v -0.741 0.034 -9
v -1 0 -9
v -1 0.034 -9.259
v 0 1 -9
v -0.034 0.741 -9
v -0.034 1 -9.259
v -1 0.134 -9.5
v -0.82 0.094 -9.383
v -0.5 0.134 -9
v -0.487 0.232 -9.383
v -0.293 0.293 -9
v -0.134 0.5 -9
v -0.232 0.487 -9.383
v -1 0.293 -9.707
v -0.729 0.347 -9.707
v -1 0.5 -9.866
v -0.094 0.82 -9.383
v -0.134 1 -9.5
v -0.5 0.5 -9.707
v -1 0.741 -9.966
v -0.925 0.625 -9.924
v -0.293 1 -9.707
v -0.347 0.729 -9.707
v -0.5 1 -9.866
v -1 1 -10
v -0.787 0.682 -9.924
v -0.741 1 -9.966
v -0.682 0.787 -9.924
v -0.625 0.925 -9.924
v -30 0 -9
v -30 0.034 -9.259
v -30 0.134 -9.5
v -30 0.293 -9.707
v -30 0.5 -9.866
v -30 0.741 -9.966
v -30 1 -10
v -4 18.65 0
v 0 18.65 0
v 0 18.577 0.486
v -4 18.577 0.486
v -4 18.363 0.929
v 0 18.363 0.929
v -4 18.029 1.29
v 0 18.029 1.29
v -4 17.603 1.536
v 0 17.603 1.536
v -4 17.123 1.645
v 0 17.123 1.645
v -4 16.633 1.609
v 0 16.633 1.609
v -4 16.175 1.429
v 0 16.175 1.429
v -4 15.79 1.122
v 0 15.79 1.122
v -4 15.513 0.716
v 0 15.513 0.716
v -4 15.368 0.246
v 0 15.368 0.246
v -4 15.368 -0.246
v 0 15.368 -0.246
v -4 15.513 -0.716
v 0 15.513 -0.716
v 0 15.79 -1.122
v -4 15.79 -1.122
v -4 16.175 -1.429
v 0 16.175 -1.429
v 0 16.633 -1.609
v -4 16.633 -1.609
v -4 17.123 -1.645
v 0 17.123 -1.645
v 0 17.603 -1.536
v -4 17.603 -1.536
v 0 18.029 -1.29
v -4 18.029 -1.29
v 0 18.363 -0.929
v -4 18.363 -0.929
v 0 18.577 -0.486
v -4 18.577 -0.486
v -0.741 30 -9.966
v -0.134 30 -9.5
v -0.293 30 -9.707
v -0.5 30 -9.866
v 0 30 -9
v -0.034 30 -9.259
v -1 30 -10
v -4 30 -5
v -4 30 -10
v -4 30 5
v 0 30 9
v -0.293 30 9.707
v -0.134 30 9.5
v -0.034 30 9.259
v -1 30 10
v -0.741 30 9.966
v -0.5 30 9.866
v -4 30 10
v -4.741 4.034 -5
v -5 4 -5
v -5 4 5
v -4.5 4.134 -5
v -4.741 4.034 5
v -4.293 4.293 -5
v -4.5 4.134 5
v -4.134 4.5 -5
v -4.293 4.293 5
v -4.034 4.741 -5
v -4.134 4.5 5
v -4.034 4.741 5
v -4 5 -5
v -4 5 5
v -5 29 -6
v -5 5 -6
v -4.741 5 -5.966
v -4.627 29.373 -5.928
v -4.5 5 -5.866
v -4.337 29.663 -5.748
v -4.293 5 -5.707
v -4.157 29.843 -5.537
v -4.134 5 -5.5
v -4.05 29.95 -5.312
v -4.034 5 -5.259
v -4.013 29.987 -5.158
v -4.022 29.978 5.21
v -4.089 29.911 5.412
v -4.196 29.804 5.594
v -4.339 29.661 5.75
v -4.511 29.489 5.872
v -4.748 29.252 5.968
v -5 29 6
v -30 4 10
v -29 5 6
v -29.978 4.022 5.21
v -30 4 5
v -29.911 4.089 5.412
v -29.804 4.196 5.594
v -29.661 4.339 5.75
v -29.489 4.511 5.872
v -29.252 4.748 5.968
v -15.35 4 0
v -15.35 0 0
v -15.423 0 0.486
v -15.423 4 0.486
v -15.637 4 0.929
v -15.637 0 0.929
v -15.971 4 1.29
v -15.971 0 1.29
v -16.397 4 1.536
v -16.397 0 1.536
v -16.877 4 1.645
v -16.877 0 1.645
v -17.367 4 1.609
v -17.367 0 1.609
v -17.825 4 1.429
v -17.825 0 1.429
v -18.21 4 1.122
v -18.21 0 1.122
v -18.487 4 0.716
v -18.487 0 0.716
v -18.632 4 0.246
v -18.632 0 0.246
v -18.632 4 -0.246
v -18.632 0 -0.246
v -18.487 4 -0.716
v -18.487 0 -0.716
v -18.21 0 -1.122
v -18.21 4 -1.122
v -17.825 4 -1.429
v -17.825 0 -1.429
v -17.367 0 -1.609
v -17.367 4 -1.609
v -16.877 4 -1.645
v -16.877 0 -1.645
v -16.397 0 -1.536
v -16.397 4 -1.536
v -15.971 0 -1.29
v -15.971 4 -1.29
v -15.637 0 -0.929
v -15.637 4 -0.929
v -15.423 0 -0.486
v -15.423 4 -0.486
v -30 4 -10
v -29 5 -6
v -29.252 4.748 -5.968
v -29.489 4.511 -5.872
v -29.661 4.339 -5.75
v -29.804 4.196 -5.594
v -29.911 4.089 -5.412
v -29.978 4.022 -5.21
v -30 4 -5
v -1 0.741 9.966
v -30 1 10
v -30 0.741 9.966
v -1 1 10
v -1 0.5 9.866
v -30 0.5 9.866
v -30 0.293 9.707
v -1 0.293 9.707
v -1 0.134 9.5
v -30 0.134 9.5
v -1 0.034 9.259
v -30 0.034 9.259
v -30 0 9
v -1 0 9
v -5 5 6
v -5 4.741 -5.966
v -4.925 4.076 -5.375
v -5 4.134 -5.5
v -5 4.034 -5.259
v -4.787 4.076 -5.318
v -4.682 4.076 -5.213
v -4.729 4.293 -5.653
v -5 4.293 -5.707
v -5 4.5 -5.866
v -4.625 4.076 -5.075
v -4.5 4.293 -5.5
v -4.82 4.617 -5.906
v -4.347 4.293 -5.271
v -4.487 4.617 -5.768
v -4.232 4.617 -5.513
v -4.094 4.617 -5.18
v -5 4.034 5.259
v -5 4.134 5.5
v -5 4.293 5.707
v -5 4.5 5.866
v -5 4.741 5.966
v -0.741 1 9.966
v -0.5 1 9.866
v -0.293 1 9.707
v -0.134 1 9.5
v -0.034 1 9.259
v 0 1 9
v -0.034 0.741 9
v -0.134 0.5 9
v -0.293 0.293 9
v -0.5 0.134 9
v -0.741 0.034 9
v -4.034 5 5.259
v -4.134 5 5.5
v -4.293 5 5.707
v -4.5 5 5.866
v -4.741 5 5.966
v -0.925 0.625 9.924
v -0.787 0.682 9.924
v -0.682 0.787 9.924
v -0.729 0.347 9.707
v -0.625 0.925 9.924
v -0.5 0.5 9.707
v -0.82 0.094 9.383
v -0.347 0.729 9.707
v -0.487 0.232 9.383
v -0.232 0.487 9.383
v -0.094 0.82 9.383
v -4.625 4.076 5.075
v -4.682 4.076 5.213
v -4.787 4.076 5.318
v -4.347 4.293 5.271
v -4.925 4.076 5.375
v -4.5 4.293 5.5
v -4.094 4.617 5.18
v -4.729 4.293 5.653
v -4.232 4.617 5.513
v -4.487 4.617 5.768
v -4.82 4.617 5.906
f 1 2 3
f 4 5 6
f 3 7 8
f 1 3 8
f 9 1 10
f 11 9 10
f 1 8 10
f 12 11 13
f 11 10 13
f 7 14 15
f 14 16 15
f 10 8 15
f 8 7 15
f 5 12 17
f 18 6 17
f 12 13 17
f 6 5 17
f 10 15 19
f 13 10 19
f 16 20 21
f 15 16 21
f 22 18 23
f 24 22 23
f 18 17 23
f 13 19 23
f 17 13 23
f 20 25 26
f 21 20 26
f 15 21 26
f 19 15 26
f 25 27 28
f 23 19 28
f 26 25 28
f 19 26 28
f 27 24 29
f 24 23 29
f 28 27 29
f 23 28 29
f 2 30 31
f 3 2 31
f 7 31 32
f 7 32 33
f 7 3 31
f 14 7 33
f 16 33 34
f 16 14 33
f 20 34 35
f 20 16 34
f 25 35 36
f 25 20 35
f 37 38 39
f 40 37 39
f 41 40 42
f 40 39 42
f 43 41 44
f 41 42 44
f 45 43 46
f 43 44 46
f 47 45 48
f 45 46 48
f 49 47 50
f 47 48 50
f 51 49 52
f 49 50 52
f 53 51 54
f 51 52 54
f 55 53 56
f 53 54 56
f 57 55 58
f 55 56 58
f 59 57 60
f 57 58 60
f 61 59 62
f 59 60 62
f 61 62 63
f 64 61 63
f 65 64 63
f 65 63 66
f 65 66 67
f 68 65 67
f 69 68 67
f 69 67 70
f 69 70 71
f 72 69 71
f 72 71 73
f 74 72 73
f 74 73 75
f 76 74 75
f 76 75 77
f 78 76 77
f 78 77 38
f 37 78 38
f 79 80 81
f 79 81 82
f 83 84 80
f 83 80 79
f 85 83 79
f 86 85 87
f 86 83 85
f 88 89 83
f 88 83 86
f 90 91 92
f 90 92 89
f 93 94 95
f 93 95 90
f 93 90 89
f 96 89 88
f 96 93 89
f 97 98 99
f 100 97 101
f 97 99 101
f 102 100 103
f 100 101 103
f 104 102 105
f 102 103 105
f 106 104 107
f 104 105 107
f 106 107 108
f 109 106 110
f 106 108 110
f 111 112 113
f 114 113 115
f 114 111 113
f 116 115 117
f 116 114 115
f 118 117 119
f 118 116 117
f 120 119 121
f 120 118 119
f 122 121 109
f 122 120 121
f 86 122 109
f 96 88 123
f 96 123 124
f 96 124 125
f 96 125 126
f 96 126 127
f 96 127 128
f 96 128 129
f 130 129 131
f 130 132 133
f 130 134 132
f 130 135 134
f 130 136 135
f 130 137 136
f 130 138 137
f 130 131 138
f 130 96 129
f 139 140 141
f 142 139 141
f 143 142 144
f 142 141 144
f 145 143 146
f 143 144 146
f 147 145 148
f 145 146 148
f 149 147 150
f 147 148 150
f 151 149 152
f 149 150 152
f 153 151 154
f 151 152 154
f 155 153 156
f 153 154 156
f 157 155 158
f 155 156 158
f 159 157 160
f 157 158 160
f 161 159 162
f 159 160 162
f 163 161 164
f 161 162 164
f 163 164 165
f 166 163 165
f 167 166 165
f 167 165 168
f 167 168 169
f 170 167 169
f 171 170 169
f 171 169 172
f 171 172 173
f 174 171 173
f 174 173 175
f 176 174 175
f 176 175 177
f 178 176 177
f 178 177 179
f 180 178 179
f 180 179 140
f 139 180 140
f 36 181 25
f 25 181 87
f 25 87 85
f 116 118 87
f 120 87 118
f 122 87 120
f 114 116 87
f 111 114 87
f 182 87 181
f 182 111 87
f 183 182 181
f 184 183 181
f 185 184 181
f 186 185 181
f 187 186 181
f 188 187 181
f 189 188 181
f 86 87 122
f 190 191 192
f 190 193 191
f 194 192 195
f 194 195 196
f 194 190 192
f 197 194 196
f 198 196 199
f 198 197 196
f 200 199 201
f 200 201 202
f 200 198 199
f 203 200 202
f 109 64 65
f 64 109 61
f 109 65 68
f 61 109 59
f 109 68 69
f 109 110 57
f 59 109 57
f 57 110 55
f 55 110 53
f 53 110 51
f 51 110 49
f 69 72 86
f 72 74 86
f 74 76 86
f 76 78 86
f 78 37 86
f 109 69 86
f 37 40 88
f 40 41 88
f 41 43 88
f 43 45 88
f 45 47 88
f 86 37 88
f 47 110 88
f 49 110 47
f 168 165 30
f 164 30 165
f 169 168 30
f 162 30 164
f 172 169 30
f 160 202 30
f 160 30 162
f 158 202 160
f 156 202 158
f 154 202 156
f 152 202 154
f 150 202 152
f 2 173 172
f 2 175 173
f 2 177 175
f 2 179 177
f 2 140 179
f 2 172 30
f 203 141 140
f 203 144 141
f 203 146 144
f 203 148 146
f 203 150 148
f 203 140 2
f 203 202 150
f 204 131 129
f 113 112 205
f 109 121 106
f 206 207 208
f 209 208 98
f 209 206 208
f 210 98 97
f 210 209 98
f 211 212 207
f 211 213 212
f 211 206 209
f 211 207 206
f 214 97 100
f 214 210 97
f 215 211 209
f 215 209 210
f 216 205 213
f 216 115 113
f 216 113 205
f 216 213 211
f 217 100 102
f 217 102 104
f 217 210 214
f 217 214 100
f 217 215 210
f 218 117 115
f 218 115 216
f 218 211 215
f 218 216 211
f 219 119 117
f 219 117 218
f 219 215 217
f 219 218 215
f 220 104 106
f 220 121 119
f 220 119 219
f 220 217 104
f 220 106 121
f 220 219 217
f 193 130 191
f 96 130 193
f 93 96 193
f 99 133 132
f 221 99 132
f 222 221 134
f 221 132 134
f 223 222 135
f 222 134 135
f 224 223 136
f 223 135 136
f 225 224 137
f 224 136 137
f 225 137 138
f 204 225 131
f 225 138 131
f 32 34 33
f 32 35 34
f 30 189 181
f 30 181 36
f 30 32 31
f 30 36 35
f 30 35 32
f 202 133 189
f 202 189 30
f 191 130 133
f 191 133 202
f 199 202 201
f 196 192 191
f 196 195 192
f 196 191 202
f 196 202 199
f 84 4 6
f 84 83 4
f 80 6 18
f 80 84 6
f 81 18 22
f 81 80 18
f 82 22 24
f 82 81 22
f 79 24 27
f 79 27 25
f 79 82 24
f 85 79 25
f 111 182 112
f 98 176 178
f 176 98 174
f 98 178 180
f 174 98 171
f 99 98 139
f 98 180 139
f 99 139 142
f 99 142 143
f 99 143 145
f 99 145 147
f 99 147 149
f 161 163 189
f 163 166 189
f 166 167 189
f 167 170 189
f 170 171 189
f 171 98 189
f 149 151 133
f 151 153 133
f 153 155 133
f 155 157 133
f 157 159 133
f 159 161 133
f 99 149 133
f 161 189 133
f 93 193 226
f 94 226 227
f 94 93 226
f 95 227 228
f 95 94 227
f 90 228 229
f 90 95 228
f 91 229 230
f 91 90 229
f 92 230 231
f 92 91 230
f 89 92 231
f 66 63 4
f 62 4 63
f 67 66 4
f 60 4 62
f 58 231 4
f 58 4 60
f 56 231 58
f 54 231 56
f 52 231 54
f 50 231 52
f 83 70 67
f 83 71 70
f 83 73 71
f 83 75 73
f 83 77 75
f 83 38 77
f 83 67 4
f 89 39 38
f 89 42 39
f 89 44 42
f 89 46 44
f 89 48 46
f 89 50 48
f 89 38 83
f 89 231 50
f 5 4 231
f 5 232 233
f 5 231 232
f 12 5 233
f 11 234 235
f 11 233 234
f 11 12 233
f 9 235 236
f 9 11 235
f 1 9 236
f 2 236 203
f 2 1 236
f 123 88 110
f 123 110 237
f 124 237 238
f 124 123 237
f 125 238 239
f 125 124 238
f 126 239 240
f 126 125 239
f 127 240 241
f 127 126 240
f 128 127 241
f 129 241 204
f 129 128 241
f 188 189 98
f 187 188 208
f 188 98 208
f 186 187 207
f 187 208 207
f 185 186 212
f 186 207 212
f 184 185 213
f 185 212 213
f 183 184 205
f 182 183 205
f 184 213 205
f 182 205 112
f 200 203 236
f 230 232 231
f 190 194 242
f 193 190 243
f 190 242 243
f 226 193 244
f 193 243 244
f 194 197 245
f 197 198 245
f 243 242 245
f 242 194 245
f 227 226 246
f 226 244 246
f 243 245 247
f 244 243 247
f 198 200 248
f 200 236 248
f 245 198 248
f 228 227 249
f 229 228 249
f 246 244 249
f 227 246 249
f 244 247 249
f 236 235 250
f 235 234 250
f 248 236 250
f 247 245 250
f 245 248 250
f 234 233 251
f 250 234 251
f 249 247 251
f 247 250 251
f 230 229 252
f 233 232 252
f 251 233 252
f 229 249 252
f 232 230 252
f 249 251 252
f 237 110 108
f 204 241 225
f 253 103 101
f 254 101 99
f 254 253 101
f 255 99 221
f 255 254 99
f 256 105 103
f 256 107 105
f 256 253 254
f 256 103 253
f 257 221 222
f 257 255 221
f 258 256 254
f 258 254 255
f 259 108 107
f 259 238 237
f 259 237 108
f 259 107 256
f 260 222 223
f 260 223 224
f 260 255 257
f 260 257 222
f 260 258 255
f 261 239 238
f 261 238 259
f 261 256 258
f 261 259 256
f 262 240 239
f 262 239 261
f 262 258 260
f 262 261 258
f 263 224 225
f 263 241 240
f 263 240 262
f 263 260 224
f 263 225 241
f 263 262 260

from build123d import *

# Parameters (mm, degrees)
EXTRUDE_3_DEPTH    = 10
SHELL_START        = -30
SHELL_1_OUTLINE_W  = 27
SHELL_1_OUTLINE_H  = 12
SHELL_1_DEPTH      = 26
HOLE_WIZARD_M4_2_D = 3.3
HOLE_WIZARD_M4_3_D = 3.3
FILLET_2_R         = 1
FILLET_3_R         = 1


# Read off the part's stored shape, not the designer's step: 薄殼1
with BuildPart() as part:
    # 草圖8 → 填料-伸長3 (new, symmetric)
    with BuildSketch(Plane.XY):
        Polygon((-4, 30), (-30, 4), (-30, 0), (0, 0), (0, 30), align=None)
    extrude(amount=EXTRUDE_3_DEPTH, both=True)

    # 薄殼1 outline → 薄殼1 (cut)
    with BuildSketch(Plane.YZ.offset(SHELL_START)):
        with Locations((17.5, 0)):
            Rectangle(SHELL_1_OUTLINE_W, SHELL_1_OUTLINE_H)
    extrude(amount=SHELL_1_DEPTH, mode=Mode.SUBTRACT)

    # M4 螺紋孔2 (through all)
    with Locations(Plane(origin=(0, 4, 0), x_dir=(-1, 0, 0), z_dir=(0, 1, 0))):
        with Locations((17, 0)):
            Hole(HOLE_WIZARD_M4_2_D / 2)

    # M4 螺紋孔3 (through all)
    with Locations(Plane(origin=(-4, 0, 0), x_dir=(0, -1, 0), z_dir=(-1, 0, 0))):
        with Locations((-17, 0)):
            Hole(HOLE_WIZARD_M4_3_D / 2)

    # 圓角2
    fillet_2_edges = [part.edges().sort_by_distance(p)[0] for p in [
        (-4, 17, -6),
        (-4, 17, 6),
        (0, 0, 0),
    ]]
    fillet(fillet_2_edges, radius=FILLET_2_R)

    # 圓角3
    fillet_3_edges = [part.edges().sort_by_distance(p)[0] for p in [
        (-15.5, 0, 10),
        (-17.5, 4, -6),
        (-17.5, 4, 6),
        (-4, 4, 0),
        (-4.292893219, 4, -5.707106781),
        (-4.292893219, 4, 5.707106781),
        (0, 15.5, -10),
        (0, 15.5, 10),
        (-0.292893219, 0.292893219, -10),
        (-0.292893219, 0.292893219, 10),
        (-15.5, 0, -10),
    ]]
    fillet(fillet_3_edges, radius=FILLET_3_R)


solid = part.part
